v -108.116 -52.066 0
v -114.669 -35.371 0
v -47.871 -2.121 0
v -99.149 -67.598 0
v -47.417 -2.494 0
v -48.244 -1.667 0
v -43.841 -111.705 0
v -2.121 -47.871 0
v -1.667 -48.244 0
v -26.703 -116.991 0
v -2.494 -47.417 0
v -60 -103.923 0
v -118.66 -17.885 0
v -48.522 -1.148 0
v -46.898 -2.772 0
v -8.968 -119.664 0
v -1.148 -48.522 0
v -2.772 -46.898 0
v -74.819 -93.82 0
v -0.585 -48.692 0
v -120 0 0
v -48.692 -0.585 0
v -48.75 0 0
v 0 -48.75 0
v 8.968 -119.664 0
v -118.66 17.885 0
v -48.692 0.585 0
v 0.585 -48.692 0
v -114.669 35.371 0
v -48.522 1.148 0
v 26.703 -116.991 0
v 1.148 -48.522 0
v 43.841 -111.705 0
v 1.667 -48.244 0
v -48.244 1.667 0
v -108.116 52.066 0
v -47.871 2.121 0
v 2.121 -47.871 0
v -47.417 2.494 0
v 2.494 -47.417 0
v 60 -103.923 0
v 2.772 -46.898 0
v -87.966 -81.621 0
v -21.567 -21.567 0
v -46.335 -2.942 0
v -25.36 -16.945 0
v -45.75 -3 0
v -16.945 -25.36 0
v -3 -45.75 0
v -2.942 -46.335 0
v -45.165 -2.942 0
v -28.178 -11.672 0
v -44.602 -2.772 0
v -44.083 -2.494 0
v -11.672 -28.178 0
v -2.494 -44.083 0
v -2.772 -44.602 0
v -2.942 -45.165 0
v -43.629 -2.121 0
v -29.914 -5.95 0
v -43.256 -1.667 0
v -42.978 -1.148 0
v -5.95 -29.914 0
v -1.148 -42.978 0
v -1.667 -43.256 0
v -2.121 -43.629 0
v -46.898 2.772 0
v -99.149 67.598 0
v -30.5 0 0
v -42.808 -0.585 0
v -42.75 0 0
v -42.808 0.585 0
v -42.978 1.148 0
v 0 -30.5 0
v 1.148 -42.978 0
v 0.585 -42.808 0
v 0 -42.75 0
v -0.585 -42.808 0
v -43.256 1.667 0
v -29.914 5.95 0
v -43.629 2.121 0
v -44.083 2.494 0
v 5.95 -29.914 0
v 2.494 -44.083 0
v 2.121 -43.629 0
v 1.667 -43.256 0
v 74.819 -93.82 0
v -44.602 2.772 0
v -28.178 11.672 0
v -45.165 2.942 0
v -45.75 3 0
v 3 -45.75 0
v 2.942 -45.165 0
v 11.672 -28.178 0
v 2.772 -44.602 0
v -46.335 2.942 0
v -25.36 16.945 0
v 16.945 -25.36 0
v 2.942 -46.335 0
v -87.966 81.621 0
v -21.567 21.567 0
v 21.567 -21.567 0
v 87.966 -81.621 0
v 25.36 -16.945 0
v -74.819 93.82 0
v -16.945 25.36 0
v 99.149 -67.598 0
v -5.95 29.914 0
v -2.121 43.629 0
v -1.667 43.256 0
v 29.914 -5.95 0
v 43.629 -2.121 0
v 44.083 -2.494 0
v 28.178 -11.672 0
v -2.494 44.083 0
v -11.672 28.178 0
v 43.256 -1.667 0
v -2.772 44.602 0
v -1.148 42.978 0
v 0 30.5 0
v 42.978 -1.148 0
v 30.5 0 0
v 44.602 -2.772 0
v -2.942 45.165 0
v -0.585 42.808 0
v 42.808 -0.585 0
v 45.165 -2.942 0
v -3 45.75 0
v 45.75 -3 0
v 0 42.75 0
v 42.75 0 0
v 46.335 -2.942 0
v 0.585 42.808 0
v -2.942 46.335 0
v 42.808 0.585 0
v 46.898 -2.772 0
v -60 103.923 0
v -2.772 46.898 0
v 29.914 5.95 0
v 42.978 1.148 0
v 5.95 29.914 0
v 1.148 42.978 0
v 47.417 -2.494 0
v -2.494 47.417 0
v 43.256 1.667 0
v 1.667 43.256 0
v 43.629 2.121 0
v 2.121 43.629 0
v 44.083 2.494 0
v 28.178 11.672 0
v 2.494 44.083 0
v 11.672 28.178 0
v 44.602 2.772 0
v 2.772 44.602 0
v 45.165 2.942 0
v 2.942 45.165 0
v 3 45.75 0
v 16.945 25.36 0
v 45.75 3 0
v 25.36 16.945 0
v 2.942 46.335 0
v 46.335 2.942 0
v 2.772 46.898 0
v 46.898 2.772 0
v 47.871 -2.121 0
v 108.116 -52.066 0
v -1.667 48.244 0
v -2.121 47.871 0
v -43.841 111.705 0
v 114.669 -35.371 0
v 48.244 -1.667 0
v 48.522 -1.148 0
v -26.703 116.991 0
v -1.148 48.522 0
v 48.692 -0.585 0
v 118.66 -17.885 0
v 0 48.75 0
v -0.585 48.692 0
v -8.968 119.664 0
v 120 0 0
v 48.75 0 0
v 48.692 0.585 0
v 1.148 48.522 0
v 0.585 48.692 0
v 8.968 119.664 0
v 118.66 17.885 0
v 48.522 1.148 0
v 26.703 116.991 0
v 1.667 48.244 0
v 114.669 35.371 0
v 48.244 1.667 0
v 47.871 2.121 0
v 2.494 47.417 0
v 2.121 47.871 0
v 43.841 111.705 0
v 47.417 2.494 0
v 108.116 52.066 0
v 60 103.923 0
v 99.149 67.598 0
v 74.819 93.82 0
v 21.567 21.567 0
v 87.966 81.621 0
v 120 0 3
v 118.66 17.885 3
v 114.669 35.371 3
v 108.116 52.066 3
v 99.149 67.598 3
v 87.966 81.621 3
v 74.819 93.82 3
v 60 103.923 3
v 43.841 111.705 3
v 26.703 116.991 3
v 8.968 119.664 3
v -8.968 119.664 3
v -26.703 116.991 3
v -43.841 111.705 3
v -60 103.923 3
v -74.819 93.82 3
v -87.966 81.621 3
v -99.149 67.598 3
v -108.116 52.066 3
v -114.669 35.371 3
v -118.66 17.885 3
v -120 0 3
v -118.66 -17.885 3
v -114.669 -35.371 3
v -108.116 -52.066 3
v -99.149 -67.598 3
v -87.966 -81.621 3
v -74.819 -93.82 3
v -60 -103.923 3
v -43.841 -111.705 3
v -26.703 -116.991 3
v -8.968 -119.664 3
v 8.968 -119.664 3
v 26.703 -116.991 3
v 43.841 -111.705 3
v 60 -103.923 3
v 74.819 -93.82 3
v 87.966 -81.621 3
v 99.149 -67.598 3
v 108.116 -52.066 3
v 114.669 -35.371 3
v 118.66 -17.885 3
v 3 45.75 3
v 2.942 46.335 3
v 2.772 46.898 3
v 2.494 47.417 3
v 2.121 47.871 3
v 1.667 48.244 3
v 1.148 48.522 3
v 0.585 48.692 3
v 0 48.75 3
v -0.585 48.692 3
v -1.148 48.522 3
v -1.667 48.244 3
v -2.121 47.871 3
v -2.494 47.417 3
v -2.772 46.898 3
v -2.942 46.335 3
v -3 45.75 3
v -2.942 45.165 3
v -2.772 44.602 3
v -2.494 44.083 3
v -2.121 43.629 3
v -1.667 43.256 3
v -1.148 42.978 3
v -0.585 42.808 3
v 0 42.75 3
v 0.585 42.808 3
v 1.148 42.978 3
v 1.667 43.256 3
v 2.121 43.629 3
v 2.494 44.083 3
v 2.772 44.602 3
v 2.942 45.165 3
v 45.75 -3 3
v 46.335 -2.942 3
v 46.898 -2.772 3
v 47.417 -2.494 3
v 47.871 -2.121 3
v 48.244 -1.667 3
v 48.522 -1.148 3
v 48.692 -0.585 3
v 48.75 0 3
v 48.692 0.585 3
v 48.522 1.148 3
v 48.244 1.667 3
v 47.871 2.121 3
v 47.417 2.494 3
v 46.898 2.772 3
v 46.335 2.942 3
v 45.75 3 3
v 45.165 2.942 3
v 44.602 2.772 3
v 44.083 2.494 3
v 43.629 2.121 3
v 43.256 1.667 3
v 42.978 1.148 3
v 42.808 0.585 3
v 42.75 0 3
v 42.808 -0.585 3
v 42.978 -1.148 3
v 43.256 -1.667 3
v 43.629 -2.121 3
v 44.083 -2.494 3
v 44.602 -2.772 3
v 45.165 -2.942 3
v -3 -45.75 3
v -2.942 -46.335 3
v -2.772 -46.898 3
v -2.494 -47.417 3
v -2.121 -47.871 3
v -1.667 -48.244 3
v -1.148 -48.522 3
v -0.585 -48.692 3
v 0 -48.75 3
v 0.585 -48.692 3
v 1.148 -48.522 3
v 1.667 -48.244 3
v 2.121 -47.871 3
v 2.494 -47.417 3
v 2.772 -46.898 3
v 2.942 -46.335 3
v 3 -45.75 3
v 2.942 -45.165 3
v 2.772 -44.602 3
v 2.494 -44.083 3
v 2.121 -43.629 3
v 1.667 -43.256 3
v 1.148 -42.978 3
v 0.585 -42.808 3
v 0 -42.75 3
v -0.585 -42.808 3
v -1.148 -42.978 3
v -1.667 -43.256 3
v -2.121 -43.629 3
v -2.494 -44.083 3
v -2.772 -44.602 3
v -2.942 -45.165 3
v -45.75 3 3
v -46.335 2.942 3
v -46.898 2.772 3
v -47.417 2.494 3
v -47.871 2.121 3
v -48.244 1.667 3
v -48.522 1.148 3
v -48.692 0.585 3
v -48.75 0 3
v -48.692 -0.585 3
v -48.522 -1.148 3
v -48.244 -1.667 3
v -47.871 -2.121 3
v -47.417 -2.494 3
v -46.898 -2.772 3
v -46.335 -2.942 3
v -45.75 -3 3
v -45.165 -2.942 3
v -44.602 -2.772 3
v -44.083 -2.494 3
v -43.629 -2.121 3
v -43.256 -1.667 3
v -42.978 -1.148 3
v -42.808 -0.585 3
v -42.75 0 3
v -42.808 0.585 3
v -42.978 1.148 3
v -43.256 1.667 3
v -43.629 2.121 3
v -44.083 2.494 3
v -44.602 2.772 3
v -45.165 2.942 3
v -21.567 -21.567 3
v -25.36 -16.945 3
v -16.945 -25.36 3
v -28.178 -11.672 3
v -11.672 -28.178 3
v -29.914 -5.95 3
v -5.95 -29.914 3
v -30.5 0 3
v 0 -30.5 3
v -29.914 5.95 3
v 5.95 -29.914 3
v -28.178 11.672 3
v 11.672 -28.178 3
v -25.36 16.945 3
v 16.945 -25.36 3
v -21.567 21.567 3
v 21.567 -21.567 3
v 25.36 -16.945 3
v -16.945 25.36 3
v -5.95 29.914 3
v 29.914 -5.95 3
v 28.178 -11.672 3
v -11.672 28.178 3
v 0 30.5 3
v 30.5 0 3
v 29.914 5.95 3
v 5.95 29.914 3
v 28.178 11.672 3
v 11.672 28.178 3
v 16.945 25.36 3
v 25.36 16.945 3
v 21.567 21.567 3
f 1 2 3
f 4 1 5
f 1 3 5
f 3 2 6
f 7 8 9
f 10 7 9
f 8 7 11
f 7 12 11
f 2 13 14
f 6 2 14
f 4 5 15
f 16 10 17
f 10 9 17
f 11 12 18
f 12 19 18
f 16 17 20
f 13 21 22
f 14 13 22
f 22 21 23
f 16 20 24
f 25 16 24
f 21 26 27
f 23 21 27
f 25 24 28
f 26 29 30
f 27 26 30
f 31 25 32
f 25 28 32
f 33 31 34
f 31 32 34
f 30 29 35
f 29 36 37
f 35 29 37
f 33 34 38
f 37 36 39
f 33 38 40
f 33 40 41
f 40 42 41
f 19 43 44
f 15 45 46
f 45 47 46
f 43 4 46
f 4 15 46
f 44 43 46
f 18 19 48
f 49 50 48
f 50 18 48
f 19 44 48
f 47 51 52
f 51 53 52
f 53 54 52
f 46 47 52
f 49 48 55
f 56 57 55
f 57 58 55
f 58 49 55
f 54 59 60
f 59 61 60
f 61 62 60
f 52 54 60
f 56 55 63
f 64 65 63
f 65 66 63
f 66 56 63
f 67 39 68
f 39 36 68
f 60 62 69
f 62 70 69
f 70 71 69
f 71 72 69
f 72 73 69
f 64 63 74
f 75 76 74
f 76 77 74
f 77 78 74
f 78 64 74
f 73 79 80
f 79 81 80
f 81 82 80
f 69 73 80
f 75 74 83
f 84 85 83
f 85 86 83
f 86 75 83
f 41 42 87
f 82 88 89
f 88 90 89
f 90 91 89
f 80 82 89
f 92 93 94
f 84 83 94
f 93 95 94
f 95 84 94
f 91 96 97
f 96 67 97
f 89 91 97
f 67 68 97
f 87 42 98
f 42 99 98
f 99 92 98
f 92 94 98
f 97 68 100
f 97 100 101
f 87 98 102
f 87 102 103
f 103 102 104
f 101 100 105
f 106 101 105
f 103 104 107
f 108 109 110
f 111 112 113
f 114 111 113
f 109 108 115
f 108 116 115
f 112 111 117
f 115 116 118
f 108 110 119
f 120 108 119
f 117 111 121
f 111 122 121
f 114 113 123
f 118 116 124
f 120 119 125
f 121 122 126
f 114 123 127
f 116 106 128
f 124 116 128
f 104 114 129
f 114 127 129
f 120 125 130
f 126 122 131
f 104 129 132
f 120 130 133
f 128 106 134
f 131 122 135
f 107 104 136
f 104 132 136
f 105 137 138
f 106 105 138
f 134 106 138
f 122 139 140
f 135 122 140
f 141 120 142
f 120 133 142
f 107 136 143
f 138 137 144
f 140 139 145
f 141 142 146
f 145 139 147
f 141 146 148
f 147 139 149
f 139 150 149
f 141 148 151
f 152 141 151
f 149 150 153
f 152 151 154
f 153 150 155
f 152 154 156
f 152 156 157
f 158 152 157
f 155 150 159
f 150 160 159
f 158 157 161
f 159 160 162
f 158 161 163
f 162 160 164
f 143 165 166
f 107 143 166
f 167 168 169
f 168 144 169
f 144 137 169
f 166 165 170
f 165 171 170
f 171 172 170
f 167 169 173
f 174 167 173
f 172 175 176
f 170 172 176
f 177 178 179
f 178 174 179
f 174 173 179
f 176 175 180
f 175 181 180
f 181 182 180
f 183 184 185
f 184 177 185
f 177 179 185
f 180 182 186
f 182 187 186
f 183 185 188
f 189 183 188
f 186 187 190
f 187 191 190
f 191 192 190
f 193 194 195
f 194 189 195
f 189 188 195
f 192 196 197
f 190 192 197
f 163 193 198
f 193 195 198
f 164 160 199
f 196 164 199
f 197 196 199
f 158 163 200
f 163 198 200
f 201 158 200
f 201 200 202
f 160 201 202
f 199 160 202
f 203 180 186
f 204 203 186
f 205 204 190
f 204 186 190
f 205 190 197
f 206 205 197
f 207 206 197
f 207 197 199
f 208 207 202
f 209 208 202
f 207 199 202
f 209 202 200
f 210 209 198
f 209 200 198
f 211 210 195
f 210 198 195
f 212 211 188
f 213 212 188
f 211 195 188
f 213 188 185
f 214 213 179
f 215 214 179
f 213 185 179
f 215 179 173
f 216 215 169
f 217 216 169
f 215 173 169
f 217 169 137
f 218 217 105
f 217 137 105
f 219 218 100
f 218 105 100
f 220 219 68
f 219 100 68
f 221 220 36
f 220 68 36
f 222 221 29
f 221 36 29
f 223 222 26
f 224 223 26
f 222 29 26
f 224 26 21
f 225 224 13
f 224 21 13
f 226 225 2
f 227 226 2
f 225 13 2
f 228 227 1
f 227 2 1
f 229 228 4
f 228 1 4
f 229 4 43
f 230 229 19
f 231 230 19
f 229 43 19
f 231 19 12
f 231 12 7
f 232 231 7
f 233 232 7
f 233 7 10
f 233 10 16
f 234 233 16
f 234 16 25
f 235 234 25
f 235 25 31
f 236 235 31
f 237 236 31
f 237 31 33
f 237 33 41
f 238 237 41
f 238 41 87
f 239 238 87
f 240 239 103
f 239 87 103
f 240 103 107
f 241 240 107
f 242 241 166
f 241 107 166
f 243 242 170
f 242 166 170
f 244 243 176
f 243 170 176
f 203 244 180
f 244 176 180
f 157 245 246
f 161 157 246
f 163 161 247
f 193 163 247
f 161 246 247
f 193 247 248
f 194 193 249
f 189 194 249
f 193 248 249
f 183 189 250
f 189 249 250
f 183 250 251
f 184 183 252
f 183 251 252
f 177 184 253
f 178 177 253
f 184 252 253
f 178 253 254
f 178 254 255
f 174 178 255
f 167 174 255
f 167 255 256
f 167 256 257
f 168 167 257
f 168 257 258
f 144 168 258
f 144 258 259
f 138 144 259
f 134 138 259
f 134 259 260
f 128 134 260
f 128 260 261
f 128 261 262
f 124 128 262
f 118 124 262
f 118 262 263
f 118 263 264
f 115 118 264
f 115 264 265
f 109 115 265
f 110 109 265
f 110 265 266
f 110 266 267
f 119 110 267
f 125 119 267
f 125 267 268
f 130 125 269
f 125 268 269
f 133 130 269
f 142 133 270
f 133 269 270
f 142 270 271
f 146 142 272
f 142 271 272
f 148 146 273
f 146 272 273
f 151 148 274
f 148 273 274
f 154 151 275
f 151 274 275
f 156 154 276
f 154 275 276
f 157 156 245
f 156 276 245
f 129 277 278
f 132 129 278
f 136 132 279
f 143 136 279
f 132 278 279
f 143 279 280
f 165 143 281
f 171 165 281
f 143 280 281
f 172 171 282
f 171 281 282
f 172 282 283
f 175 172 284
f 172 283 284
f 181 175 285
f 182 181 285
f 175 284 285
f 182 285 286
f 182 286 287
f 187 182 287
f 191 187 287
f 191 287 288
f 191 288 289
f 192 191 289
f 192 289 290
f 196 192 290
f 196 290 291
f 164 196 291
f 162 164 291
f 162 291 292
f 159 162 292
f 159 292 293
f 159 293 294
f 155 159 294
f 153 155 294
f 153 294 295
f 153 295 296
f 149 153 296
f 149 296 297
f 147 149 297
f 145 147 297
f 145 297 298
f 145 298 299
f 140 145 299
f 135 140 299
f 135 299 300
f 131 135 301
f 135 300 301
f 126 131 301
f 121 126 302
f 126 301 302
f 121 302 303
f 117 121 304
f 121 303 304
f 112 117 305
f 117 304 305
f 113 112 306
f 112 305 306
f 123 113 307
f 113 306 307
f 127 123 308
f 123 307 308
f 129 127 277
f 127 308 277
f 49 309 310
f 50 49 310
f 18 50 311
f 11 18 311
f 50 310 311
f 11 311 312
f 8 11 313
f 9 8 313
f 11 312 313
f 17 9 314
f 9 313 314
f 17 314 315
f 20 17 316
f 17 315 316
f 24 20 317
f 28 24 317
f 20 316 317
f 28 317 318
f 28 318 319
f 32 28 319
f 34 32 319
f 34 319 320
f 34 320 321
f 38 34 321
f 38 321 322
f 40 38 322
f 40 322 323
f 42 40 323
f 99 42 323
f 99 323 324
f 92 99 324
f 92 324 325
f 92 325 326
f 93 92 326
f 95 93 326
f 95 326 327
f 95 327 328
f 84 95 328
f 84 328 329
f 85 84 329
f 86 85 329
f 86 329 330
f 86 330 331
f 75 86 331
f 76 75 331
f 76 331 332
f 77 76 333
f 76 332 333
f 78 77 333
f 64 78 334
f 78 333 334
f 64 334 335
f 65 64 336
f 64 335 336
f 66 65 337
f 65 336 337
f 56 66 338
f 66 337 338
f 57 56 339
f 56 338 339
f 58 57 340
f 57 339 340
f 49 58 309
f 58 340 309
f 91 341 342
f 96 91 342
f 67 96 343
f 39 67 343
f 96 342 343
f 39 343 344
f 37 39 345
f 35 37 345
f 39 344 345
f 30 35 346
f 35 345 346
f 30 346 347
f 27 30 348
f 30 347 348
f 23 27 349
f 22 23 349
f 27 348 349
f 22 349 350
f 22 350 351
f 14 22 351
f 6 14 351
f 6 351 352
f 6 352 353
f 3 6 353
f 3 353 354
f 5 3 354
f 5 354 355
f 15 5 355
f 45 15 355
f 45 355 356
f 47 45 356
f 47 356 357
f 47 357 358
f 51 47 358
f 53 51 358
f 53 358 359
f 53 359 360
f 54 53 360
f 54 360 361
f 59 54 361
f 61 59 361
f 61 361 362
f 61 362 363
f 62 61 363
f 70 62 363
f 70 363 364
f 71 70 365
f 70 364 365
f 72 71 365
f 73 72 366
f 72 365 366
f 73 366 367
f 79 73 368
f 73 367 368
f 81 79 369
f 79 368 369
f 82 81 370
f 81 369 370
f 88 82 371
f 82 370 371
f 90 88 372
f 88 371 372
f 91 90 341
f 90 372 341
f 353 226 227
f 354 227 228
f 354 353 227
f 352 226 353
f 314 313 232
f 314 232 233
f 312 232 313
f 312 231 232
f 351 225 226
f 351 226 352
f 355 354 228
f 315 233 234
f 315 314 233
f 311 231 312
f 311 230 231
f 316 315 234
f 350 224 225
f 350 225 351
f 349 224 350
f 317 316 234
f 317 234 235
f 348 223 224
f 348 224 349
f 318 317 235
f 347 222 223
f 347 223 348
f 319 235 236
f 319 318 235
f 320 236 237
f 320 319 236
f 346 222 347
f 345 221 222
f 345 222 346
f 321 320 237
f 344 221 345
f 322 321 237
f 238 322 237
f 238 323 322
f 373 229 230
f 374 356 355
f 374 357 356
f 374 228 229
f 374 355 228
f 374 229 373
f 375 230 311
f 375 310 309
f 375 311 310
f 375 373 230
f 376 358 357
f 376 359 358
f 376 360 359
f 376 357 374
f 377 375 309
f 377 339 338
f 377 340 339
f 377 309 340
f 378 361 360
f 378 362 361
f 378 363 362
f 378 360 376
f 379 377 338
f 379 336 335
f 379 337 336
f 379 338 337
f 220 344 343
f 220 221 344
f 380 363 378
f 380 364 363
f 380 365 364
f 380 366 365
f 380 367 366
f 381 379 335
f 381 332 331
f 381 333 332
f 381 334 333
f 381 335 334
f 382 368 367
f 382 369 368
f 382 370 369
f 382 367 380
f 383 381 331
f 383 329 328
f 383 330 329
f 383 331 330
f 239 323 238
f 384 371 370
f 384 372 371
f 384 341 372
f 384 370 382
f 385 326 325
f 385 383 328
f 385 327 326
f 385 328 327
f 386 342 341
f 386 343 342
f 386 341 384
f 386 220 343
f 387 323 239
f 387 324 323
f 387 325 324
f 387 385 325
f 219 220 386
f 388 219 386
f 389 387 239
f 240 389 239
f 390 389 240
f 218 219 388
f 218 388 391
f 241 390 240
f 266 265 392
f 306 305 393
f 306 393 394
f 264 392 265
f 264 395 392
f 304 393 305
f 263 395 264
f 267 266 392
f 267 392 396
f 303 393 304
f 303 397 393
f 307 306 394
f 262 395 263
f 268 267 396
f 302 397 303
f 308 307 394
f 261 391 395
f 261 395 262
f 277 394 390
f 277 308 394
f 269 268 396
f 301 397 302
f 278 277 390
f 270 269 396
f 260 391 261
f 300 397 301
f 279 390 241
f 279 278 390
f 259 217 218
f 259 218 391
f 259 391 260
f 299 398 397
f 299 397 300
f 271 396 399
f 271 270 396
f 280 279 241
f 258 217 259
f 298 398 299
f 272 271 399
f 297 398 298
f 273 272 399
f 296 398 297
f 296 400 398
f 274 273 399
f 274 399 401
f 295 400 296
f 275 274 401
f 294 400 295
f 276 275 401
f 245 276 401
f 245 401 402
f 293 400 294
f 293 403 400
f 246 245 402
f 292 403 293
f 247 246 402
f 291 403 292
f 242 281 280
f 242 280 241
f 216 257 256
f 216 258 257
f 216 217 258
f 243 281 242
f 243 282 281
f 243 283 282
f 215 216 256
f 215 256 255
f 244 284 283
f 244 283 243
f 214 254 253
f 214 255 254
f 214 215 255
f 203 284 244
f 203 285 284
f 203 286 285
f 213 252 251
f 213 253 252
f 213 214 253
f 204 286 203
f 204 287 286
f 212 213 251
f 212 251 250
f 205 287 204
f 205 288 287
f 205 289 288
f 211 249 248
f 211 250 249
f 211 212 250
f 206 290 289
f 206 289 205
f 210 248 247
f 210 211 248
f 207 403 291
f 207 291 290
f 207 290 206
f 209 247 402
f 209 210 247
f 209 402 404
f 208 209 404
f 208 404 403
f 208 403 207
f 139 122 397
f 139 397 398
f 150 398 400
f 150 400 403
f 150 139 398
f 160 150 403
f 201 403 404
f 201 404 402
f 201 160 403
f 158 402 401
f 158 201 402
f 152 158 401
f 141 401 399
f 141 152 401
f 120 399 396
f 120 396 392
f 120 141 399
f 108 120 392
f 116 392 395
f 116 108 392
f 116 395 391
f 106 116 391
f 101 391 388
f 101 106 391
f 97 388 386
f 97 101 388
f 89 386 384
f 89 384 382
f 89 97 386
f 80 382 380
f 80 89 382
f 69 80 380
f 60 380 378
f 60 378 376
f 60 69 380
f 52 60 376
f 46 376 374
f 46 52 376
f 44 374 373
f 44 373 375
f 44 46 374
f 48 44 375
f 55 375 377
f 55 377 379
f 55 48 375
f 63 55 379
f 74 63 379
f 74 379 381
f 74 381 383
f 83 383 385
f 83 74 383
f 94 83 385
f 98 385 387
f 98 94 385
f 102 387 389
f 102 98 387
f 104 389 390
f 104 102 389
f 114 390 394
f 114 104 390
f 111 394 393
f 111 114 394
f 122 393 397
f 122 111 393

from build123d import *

# Parameters (mm, degrees)
SKETCH_R           = 120
SKETCH_R_2         = 30.5
PAD_DEPTH          = 3
SKETCH001_R        = 3
POCKET_DEPTH       = 681.850026
POLARPATTERN_COUNT = 4


with BuildPart() as part:
    # Sketch → Pad (new body)
    with BuildSketch(Plane.XY):
        Circle(SKETCH_R)
        Circle(SKETCH_R_2, mode=Mode.SUBTRACT)
    extrude(amount=PAD_DEPTH)

    # Sketch001 (on Face4 of Pad) → Pocket (cut, through all)
    with BuildSketch(Plane.XY.offset(3)):
        with Locations((0, 45.75)):
            Circle(SKETCH001_R)
    pocket = extrude(amount=-POCKET_DEPTH, mode=Mode.SUBTRACT)

    # PolarPattern: Pocket ×4 about axis
    polarpattern_axis = Axis((0, 0, 3), (0, 0, 1))
    for i in range(1, POLARPATTERN_COUNT):
        add(pocket.rotate(polarpattern_axis, i * 360 / POLARPATTERN_COUNT), mode=Mode.SUBTRACT)


solid = part.part
